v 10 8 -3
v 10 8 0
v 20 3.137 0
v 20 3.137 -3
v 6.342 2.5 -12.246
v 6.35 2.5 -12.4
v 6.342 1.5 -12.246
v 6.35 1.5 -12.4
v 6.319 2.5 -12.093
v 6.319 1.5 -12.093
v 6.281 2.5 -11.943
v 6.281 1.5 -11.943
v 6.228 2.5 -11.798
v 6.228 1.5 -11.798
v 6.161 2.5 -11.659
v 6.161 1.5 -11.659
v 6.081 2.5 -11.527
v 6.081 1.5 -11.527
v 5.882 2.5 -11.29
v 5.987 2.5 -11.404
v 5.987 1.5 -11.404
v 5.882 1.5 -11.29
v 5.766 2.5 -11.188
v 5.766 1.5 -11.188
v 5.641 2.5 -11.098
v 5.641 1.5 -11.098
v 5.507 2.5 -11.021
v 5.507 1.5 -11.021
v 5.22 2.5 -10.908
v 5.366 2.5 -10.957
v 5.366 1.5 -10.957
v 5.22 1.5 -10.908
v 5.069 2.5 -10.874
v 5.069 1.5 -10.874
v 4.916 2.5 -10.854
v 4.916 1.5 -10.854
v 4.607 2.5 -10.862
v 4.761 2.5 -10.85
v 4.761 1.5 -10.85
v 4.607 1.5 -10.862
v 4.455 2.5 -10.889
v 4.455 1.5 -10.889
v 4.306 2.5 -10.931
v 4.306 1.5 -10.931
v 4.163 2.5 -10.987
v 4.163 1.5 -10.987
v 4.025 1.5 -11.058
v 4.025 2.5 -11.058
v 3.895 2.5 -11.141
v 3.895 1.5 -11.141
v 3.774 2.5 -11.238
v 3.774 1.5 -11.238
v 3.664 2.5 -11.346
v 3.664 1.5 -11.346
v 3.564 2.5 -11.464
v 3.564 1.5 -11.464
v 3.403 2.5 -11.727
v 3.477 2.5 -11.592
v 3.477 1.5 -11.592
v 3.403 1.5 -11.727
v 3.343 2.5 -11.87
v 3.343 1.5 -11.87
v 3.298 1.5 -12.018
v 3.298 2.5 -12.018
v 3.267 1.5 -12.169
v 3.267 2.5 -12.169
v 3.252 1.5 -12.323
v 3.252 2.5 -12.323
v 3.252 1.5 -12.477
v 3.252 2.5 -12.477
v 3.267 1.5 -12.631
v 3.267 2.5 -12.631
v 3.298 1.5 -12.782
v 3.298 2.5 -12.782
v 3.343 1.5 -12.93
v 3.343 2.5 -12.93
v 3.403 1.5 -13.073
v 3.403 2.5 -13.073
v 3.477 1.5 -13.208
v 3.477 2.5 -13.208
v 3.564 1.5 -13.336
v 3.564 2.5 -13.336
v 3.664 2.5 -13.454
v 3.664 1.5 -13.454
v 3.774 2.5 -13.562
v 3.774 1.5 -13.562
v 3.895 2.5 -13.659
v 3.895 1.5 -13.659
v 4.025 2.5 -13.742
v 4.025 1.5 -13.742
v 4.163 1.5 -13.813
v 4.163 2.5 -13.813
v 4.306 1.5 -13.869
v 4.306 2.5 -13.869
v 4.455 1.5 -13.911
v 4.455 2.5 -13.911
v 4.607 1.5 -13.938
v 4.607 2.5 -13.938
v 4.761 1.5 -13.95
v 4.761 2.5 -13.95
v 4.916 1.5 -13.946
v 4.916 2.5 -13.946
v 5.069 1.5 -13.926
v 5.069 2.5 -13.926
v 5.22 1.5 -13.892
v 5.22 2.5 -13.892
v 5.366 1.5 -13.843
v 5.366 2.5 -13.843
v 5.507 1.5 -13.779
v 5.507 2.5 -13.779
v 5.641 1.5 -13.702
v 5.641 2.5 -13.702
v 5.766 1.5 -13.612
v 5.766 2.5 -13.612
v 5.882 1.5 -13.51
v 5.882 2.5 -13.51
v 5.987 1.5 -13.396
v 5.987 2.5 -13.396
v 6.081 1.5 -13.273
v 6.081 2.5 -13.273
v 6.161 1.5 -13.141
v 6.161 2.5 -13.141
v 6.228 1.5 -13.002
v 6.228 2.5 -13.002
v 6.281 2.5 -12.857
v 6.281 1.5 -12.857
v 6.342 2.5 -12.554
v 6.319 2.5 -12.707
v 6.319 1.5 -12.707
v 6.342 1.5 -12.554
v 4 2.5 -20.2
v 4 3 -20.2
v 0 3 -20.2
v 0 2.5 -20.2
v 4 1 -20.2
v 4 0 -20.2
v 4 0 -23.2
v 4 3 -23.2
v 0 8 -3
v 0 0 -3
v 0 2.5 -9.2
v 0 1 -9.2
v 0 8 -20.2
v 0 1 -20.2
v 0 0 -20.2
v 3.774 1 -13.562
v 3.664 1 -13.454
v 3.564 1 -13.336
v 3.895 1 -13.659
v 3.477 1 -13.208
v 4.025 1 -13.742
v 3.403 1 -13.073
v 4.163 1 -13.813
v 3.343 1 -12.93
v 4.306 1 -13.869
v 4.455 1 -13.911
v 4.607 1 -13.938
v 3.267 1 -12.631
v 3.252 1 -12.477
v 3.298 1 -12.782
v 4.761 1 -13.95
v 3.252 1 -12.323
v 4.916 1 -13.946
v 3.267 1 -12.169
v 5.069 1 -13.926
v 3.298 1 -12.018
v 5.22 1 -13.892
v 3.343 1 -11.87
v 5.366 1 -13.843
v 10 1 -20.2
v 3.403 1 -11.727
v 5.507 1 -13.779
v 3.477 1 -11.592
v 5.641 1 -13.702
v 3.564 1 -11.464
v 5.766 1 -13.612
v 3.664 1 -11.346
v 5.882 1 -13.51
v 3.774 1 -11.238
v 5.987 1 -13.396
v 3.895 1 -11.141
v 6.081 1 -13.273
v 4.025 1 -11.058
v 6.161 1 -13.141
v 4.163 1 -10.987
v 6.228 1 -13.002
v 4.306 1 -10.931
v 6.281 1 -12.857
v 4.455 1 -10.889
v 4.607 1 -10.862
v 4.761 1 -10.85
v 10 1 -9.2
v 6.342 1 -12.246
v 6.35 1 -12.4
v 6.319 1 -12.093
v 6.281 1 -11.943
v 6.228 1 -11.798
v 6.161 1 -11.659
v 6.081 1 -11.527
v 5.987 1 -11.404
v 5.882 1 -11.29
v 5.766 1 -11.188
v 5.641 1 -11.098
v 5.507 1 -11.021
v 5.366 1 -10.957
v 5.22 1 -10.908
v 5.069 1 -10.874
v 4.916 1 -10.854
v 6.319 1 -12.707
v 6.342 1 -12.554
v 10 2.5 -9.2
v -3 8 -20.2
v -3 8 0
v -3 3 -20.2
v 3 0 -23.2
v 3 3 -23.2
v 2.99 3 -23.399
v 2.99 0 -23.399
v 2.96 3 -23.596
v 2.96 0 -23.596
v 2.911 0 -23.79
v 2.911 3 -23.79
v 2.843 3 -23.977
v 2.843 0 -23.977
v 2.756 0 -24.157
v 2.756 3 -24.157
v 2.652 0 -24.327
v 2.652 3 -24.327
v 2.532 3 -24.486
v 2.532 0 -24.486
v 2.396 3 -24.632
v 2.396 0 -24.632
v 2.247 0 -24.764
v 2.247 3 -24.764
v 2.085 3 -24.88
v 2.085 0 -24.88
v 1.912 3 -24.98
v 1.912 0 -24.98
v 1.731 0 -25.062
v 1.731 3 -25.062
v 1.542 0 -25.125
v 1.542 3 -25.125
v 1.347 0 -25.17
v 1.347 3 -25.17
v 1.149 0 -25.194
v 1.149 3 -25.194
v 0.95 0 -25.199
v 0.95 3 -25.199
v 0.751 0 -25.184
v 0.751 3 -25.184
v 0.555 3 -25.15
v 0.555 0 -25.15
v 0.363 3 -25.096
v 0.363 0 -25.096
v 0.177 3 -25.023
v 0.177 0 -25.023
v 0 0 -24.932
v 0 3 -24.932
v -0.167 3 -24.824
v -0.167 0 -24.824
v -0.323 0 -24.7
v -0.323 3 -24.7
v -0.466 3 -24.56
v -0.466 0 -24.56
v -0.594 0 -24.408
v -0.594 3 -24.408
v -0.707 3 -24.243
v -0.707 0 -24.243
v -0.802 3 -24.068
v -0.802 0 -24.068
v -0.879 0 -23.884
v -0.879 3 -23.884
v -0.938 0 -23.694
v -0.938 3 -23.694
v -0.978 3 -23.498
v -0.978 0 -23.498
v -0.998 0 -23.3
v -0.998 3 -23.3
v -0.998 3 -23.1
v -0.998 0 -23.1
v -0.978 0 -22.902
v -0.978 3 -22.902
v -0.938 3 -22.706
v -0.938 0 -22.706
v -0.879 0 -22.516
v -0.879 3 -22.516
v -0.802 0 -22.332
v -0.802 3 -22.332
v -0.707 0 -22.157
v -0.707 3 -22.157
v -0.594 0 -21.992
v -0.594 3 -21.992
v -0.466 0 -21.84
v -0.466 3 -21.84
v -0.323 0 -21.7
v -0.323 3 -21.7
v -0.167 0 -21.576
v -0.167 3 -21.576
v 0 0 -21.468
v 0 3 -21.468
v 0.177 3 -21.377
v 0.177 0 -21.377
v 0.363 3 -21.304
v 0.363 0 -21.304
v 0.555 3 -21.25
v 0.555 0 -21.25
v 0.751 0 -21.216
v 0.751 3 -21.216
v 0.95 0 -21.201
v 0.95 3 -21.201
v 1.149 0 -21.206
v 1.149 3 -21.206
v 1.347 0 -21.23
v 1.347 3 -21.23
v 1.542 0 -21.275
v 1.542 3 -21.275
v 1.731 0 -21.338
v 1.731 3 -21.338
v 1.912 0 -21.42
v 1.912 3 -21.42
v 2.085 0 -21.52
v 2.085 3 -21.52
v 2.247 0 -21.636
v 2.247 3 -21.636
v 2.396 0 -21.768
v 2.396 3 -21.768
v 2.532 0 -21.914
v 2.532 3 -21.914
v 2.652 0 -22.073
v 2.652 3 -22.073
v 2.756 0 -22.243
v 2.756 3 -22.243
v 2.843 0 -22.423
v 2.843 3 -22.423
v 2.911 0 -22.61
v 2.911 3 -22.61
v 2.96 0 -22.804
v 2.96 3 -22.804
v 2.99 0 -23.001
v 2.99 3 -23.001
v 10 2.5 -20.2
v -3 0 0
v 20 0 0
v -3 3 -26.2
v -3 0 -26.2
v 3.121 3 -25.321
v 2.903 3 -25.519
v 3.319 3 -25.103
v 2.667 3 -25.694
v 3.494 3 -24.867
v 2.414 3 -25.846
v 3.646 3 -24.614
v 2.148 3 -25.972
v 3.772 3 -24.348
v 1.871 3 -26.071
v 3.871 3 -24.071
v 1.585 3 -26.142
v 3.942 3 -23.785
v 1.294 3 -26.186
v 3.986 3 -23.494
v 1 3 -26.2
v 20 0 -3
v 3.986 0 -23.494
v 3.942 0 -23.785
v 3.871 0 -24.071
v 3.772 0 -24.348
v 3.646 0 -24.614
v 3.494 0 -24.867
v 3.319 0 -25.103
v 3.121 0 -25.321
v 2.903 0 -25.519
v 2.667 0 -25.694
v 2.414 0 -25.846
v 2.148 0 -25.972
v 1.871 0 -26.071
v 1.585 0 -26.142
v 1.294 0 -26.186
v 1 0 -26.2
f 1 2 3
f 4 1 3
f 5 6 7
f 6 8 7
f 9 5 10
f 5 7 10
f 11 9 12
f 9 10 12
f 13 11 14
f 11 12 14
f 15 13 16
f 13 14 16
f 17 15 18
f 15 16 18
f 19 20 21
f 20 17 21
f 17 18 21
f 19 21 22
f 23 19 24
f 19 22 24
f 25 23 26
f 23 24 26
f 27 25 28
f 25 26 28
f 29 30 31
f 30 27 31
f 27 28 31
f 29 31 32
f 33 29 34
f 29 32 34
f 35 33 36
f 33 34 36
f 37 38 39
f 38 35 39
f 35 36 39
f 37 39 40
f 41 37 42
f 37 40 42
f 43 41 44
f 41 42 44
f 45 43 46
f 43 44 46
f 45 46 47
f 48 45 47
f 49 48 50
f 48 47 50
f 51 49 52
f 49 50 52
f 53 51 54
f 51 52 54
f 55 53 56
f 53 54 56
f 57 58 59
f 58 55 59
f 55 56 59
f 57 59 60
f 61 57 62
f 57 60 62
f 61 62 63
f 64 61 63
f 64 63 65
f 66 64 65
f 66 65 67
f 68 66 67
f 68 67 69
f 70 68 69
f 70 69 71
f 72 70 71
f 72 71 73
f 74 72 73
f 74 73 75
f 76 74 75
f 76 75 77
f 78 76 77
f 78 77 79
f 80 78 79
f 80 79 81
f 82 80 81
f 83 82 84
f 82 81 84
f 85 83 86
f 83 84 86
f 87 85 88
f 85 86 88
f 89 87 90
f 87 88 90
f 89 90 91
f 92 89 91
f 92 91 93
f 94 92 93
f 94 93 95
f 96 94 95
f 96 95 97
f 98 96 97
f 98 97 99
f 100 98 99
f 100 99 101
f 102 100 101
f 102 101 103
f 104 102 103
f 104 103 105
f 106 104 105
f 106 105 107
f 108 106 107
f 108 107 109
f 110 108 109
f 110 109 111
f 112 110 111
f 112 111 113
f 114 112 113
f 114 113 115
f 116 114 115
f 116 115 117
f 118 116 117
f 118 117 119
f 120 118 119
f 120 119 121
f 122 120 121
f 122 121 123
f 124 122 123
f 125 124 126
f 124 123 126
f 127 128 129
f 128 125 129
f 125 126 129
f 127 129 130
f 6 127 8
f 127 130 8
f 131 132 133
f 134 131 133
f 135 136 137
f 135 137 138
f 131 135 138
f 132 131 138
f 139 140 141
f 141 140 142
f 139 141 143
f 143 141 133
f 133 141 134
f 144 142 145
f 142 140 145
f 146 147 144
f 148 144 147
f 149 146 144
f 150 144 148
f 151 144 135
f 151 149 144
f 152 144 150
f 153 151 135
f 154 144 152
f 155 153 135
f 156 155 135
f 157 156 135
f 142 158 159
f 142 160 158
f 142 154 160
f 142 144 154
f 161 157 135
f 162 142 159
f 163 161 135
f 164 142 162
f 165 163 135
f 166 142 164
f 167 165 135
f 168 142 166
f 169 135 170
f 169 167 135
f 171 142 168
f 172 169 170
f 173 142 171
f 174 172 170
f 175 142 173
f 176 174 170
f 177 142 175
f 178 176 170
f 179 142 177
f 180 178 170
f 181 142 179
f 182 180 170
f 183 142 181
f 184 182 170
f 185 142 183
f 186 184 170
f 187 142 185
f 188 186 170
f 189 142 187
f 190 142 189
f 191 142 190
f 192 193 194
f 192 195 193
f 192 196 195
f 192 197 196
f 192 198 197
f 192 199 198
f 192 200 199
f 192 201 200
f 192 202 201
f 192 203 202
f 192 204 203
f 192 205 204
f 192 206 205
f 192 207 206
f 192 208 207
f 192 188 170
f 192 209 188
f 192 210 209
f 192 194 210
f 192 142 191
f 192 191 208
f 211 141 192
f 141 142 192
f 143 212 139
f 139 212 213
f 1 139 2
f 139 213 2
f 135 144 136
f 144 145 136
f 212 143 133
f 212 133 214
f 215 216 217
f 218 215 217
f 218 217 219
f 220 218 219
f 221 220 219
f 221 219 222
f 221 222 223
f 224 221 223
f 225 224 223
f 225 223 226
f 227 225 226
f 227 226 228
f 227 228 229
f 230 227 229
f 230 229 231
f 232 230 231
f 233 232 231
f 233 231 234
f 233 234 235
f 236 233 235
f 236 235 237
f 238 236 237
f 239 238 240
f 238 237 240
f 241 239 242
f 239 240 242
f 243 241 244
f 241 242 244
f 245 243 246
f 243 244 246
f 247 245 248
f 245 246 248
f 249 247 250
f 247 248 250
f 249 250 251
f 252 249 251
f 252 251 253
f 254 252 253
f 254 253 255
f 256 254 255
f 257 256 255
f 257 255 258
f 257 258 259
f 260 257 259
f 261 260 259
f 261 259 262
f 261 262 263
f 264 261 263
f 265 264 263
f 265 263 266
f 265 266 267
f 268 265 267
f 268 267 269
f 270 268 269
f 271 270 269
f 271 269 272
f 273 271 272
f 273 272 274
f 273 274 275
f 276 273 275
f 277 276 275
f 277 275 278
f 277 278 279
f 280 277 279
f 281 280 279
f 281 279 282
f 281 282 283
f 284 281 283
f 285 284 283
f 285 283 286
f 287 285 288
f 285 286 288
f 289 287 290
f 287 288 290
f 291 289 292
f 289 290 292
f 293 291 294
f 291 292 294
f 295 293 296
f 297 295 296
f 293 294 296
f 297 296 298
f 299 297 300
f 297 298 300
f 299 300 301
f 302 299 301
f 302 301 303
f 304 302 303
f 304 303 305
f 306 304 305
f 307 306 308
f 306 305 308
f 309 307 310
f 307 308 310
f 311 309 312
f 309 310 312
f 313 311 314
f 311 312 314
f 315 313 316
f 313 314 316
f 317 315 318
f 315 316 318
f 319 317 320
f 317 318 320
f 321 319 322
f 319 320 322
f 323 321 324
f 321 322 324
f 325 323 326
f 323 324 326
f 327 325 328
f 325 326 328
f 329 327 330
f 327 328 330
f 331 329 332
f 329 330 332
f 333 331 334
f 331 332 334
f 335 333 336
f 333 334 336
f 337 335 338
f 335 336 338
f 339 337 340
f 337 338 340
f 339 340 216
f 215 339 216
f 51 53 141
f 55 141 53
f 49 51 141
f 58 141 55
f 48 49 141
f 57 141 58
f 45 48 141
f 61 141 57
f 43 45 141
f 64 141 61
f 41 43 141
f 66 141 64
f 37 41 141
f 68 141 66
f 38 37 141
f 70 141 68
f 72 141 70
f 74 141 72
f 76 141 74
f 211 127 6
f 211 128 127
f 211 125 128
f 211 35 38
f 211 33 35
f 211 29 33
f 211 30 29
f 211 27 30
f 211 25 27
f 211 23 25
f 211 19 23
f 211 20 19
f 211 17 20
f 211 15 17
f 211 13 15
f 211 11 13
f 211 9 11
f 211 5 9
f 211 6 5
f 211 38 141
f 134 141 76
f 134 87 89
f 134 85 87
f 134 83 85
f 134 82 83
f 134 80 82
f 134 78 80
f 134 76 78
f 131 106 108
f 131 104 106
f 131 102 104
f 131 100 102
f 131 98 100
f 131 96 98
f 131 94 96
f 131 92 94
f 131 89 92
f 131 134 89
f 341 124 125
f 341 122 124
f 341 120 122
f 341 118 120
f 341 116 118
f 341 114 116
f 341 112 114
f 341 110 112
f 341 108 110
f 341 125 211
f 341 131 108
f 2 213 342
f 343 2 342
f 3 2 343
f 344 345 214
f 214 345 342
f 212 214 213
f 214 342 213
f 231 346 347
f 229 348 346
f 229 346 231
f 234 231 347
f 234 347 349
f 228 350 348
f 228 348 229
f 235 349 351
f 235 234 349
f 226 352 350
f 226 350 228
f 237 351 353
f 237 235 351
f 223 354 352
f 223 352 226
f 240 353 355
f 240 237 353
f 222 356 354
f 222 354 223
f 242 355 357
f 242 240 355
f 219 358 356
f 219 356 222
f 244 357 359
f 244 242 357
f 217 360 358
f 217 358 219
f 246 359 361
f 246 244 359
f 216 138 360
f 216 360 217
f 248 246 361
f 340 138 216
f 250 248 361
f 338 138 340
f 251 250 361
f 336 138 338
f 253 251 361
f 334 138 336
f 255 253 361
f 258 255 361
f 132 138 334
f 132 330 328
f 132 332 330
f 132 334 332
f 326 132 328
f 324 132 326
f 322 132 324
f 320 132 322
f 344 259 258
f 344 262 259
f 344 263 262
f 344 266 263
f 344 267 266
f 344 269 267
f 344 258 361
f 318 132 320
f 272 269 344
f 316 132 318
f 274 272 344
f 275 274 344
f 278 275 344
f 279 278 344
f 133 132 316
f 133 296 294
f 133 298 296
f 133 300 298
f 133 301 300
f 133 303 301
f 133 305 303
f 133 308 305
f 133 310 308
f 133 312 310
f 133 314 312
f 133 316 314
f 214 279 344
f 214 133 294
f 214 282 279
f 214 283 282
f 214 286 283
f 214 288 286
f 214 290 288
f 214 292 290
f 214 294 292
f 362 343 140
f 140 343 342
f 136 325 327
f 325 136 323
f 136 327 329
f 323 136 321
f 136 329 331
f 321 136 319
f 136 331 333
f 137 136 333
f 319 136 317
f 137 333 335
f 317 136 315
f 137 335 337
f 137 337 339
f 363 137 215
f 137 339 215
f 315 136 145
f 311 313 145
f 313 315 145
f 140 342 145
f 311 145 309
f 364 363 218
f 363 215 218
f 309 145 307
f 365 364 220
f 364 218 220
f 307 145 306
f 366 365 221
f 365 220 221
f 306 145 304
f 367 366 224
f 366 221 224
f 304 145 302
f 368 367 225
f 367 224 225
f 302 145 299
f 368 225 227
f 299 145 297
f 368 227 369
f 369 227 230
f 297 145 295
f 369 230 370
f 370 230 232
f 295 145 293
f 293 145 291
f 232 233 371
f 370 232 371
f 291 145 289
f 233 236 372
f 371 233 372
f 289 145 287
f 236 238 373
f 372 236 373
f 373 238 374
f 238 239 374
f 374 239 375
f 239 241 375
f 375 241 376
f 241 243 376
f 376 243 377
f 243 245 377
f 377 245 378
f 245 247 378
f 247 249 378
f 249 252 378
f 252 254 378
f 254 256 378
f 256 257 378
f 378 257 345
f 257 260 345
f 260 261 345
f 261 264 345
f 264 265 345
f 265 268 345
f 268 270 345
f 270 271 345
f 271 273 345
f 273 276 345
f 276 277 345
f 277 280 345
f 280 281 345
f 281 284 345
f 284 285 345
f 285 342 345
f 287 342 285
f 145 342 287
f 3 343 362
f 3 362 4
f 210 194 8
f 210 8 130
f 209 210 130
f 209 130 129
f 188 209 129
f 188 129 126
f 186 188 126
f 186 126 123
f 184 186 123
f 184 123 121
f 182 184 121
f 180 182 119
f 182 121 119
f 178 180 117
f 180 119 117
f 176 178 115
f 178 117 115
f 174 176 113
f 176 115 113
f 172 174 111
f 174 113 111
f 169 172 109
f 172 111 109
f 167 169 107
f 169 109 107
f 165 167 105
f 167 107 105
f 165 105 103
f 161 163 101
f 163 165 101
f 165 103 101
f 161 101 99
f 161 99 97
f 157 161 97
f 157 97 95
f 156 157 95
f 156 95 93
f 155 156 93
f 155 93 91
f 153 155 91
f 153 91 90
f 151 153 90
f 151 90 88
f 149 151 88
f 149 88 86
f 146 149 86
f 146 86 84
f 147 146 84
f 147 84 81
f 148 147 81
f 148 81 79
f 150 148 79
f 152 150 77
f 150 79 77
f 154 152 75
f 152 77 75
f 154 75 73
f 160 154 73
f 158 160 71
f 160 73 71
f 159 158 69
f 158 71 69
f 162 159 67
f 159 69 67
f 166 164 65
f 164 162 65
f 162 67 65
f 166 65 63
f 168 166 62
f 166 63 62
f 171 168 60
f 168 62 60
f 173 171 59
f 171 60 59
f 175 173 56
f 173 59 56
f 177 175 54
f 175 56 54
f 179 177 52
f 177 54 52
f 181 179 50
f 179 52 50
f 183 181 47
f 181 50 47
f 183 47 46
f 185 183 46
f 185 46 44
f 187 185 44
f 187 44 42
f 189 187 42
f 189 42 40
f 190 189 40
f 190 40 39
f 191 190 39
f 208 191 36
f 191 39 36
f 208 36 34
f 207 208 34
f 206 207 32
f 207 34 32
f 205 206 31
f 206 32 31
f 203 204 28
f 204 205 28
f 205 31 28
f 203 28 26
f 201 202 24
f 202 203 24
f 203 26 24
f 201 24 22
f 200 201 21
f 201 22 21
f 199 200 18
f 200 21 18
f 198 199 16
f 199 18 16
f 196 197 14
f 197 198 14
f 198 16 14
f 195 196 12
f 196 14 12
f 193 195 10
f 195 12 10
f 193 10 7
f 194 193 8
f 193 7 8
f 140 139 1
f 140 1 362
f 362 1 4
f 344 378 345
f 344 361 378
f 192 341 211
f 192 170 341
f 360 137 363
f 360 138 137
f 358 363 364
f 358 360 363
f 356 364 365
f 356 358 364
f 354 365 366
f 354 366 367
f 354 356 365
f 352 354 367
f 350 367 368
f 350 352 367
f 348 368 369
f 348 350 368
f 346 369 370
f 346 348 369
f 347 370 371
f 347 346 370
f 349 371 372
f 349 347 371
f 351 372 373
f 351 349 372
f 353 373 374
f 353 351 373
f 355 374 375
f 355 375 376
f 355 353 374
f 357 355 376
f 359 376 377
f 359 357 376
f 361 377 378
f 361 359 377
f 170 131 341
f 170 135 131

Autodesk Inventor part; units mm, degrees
ref_plane "YZ Plane" through (0, 0, 0) normal (1, 0, 0) x (0, 1, 0)
ref_plane "XZ Plane" through (0, 0, 0) normal (0, 1, 0) x (-1, 0, 0)
ref_plane "XY Plane" through (0, 0, 0) normal (0, 0, 1) x (1, 0, 0)
sketch "Szkic1" plane through (0, 0, 0) normal (0, 1, 0) x (-1, 0, 0)
  line L0 (0, 0) -> (3, 0)
  line L1 (3, 0) -> (3, -22)
  line L2 (3, -22) -> (0, -22)
  line L3 (0, -22) -> (0, 0)
  line L4 (0, 0) -> (-20, 0)
  line L5 (-20, 0) -> (-20, -3)
  line L6 (-20, -3) -> (0, -3)
  line L7 (0, -3) -> (0, 0)
  line L8 (0, -22) -> (-3, -22)
  line L9 (-3, -22) -> (-3, -17)
  line L10 (-3, -17) -> (0, -17)
  line L11 (0, -17) -> (0, -22)
  dimension "d0" = 3
  dimension "d1" = 22
  dimension "d2" = 20
  dimension "d3" = 3
  dimension "d4" = 3
  dimension "d5" = 5
extrude "Wyciągnięcie proste1" add sketch "Szkic1" along normal blind 8
sketch "Szkic2" plane through (20, 0, -3) normal (0, 0, -1) x (-1, 0, 0)
  line L0 (0, 0) -> (0, 8) projected
  line L1 (0, 0) -> (20, 8)
  line L2 (23, 8) -> (0, 8) projected
  point P0 (20, 0)
extrude "Wyciągnięcie proste2" cut sketch "Szkic2" against normal blind 3
sketch "Szkic3" plane through (0, 8, 0) normal (0, 1, 0) x (1, 0, 0)
  point P0 (0, 0)
sketch "Szkic4" plane through (3, 0, -17) normal (1, 0, 0) x (0, 0, -1)
  line L0 (5, 0) -> (5, 8) projected
  line L1 (0, 0) -> (0, 8) projected
  line L2 (5, 0) -> (0, 0)
  line L3 (0, 0) -> (0, 8)
  line L4 (0, 8) -> (5, 8)
  line L5 (5, 8) -> (5, 0)
  point P0 (-17, 0)
extrude "Wyciągnięcie proste3" cut sketch "Szkic4" against normal blind 3
sketch "Szkic5" plane through (0, 0, -22) normal (0, 0, -1) x (-1, 0, 0)
  line L0 (3, 8) -> (0, 8) projected
  line L1 (0, 0) -> (3, 0)
  line L2 (3, 0) -> (3, 8)
  line L3 (3, 8) -> (0, 8)
  line L4 (0, 8) -> (0, 0)
extrude "Wyciągnięcie proste4" cut sketch "Szkic5" against normal blind 1.8
sketch "Szkic6" plane through (0, 0, -20.2) normal (0, 0, -1) x (-1, 0, 0)
  line L0 (3, 0) -> (3, 8) projected
  line L1 (3, 0) -> (-4, 0)
  line L2 (-4, 0) -> (-4, 3)
  line L3 (-4, 3) -> (3, 3)
  line L4 (3, 3) -> (3, 0)
  point P0 (0, 0)
  dimension "d14" = 7
  dimension "d15" = 3
extrude "Wyciągnięcie proste5" add sketch "Szkic6" along normal blind 6
sketch "Szkic7" plane through (0, 3, -20.2) normal (0, 1, 0) x (1, 0, 0)
  circle A0 centre (1, 3) radius 2
  line L0 (-3, 0) -> (-3, 6) projected
  line L1 (-3, 6) -> (4, 6) projected
  point P0 (0, -20.2)
  point P1 (-3, 3)
  point P2 (0.5, 6)
  dimension "d18" = 4
  dimension "d19" = 4
  dimension "d20" = 3
extrude "Wyciągnięcie proste6" cut sketch "Szkic7" against normal blind 3
sketch "Szkic8" plane through (-3, 0, 0) normal (0, 0, 1) x (1, 0, 0)
  line L0 (3, 8) -> (13, 8)
  line L1 (23, 0) -> (3, 0) projected
  line L2 (23, 0) -> (23, 3.137)
  line L3 (13, 8) -> (23, 3.137)
  line L4 (23, 0) -> (3, 8) projected
  line L5 (3, 8) -> (23, 0)
  dimension "d23" = 10
  dimension "d24" = 3.137
extrude "Wyciągnięcie proste7" add sketch "Szkic8" against normal blind 3
sketch "Szkic9" plane through (0, 0, -3) normal (1, 0, 0) x (0, 0, -1)
  line L0 (0, 0) -> (17.2, 0) projected
  line L1 (17.2, 0) -> (6.2, 0)
  line L2 (6.2, 0) -> (6.2, 1.5)
  line L3 (6.2, 1.5) -> (17.2, 1.5)
  line L4 (17.2, 1.5) -> (17.2, 0)
  point P0 (-3, 0)
  point P1 (6.2, 0)
  dimension "d27" = 11
  dimension "d35" = 1.5
extrude "Wyciągnięcie proste8" add sketch "Szkic9" along normal blind 10
sketch "Szkic10" plane through (0, 1.5, -9.2) normal (0, 1, 0) x (1, 0, 0)
  circle A0 centre (4.8, 3.2) radius 1.55
  line L0 (0, 0) -> (10, 0) projected
  line L1 (10, 11) -> (10, 0) projected
  line L2 (4, 11) -> (10, 11) projected
  line L3 (0, -6.2) -> (0, 11) projected
  point P0 (0, -9.2)
  point P1 (5, 0)
  dimension "d30" = 3.1
  dimension "d36" = 7.8
  dimension "d37" = 4.8
extrude "Wyciągnięcie proste9" cut sketch "Szkic10" against normal blind 2
fillet "Fillet1" radius 3 1 edges at (4, 1.5, -26.2)
sketch "Szkic11" plane through (0, 1.5, -9.2) normal (0, 1, 0) x (1, 0, 0)
  circle A0 centre (4.8, 3.2) radius 1.55 projected
  line L0 (0, 0) -> (0, 11) projected
  line L1 (0, 0) -> (10, 0) projected
  line L2 (10, 11) -> (10, 0) projected
  line L3 (4, 11) -> (10, 11) projected
  line L4 (0, 11) -> (4, 11) projected
  point P0 (0, -9.2)
extrude "Wyciągnięcie proste10" add sketch "Szkic11" along normal blind 1
sketch "Szkic12" plane through (0, 0, 0) normal (0, -1, 0) x (1, 0, 0)
  line L0 (10, -9.2) -> (10, -20.2) projected
  line L1 (10, -20.2) -> (4, -20.2) projected
  line L2 (0, -20.2) -> (4, -20.2) projected
  line L3 (0, -9.2) -> (0, -20.2) projected
  line L4 (0, -9.2) -> (10, -9.2) projected
  circle A0 centre (4.8, -12.4) radius 1.55 projected
  point P0 (0, 0)
extrude "Wyciągnięcie proste11" cut sketch "Szkic12" against normal blind 1
properties part number "lfmw" material "Tworzywo sztuczne PET"
